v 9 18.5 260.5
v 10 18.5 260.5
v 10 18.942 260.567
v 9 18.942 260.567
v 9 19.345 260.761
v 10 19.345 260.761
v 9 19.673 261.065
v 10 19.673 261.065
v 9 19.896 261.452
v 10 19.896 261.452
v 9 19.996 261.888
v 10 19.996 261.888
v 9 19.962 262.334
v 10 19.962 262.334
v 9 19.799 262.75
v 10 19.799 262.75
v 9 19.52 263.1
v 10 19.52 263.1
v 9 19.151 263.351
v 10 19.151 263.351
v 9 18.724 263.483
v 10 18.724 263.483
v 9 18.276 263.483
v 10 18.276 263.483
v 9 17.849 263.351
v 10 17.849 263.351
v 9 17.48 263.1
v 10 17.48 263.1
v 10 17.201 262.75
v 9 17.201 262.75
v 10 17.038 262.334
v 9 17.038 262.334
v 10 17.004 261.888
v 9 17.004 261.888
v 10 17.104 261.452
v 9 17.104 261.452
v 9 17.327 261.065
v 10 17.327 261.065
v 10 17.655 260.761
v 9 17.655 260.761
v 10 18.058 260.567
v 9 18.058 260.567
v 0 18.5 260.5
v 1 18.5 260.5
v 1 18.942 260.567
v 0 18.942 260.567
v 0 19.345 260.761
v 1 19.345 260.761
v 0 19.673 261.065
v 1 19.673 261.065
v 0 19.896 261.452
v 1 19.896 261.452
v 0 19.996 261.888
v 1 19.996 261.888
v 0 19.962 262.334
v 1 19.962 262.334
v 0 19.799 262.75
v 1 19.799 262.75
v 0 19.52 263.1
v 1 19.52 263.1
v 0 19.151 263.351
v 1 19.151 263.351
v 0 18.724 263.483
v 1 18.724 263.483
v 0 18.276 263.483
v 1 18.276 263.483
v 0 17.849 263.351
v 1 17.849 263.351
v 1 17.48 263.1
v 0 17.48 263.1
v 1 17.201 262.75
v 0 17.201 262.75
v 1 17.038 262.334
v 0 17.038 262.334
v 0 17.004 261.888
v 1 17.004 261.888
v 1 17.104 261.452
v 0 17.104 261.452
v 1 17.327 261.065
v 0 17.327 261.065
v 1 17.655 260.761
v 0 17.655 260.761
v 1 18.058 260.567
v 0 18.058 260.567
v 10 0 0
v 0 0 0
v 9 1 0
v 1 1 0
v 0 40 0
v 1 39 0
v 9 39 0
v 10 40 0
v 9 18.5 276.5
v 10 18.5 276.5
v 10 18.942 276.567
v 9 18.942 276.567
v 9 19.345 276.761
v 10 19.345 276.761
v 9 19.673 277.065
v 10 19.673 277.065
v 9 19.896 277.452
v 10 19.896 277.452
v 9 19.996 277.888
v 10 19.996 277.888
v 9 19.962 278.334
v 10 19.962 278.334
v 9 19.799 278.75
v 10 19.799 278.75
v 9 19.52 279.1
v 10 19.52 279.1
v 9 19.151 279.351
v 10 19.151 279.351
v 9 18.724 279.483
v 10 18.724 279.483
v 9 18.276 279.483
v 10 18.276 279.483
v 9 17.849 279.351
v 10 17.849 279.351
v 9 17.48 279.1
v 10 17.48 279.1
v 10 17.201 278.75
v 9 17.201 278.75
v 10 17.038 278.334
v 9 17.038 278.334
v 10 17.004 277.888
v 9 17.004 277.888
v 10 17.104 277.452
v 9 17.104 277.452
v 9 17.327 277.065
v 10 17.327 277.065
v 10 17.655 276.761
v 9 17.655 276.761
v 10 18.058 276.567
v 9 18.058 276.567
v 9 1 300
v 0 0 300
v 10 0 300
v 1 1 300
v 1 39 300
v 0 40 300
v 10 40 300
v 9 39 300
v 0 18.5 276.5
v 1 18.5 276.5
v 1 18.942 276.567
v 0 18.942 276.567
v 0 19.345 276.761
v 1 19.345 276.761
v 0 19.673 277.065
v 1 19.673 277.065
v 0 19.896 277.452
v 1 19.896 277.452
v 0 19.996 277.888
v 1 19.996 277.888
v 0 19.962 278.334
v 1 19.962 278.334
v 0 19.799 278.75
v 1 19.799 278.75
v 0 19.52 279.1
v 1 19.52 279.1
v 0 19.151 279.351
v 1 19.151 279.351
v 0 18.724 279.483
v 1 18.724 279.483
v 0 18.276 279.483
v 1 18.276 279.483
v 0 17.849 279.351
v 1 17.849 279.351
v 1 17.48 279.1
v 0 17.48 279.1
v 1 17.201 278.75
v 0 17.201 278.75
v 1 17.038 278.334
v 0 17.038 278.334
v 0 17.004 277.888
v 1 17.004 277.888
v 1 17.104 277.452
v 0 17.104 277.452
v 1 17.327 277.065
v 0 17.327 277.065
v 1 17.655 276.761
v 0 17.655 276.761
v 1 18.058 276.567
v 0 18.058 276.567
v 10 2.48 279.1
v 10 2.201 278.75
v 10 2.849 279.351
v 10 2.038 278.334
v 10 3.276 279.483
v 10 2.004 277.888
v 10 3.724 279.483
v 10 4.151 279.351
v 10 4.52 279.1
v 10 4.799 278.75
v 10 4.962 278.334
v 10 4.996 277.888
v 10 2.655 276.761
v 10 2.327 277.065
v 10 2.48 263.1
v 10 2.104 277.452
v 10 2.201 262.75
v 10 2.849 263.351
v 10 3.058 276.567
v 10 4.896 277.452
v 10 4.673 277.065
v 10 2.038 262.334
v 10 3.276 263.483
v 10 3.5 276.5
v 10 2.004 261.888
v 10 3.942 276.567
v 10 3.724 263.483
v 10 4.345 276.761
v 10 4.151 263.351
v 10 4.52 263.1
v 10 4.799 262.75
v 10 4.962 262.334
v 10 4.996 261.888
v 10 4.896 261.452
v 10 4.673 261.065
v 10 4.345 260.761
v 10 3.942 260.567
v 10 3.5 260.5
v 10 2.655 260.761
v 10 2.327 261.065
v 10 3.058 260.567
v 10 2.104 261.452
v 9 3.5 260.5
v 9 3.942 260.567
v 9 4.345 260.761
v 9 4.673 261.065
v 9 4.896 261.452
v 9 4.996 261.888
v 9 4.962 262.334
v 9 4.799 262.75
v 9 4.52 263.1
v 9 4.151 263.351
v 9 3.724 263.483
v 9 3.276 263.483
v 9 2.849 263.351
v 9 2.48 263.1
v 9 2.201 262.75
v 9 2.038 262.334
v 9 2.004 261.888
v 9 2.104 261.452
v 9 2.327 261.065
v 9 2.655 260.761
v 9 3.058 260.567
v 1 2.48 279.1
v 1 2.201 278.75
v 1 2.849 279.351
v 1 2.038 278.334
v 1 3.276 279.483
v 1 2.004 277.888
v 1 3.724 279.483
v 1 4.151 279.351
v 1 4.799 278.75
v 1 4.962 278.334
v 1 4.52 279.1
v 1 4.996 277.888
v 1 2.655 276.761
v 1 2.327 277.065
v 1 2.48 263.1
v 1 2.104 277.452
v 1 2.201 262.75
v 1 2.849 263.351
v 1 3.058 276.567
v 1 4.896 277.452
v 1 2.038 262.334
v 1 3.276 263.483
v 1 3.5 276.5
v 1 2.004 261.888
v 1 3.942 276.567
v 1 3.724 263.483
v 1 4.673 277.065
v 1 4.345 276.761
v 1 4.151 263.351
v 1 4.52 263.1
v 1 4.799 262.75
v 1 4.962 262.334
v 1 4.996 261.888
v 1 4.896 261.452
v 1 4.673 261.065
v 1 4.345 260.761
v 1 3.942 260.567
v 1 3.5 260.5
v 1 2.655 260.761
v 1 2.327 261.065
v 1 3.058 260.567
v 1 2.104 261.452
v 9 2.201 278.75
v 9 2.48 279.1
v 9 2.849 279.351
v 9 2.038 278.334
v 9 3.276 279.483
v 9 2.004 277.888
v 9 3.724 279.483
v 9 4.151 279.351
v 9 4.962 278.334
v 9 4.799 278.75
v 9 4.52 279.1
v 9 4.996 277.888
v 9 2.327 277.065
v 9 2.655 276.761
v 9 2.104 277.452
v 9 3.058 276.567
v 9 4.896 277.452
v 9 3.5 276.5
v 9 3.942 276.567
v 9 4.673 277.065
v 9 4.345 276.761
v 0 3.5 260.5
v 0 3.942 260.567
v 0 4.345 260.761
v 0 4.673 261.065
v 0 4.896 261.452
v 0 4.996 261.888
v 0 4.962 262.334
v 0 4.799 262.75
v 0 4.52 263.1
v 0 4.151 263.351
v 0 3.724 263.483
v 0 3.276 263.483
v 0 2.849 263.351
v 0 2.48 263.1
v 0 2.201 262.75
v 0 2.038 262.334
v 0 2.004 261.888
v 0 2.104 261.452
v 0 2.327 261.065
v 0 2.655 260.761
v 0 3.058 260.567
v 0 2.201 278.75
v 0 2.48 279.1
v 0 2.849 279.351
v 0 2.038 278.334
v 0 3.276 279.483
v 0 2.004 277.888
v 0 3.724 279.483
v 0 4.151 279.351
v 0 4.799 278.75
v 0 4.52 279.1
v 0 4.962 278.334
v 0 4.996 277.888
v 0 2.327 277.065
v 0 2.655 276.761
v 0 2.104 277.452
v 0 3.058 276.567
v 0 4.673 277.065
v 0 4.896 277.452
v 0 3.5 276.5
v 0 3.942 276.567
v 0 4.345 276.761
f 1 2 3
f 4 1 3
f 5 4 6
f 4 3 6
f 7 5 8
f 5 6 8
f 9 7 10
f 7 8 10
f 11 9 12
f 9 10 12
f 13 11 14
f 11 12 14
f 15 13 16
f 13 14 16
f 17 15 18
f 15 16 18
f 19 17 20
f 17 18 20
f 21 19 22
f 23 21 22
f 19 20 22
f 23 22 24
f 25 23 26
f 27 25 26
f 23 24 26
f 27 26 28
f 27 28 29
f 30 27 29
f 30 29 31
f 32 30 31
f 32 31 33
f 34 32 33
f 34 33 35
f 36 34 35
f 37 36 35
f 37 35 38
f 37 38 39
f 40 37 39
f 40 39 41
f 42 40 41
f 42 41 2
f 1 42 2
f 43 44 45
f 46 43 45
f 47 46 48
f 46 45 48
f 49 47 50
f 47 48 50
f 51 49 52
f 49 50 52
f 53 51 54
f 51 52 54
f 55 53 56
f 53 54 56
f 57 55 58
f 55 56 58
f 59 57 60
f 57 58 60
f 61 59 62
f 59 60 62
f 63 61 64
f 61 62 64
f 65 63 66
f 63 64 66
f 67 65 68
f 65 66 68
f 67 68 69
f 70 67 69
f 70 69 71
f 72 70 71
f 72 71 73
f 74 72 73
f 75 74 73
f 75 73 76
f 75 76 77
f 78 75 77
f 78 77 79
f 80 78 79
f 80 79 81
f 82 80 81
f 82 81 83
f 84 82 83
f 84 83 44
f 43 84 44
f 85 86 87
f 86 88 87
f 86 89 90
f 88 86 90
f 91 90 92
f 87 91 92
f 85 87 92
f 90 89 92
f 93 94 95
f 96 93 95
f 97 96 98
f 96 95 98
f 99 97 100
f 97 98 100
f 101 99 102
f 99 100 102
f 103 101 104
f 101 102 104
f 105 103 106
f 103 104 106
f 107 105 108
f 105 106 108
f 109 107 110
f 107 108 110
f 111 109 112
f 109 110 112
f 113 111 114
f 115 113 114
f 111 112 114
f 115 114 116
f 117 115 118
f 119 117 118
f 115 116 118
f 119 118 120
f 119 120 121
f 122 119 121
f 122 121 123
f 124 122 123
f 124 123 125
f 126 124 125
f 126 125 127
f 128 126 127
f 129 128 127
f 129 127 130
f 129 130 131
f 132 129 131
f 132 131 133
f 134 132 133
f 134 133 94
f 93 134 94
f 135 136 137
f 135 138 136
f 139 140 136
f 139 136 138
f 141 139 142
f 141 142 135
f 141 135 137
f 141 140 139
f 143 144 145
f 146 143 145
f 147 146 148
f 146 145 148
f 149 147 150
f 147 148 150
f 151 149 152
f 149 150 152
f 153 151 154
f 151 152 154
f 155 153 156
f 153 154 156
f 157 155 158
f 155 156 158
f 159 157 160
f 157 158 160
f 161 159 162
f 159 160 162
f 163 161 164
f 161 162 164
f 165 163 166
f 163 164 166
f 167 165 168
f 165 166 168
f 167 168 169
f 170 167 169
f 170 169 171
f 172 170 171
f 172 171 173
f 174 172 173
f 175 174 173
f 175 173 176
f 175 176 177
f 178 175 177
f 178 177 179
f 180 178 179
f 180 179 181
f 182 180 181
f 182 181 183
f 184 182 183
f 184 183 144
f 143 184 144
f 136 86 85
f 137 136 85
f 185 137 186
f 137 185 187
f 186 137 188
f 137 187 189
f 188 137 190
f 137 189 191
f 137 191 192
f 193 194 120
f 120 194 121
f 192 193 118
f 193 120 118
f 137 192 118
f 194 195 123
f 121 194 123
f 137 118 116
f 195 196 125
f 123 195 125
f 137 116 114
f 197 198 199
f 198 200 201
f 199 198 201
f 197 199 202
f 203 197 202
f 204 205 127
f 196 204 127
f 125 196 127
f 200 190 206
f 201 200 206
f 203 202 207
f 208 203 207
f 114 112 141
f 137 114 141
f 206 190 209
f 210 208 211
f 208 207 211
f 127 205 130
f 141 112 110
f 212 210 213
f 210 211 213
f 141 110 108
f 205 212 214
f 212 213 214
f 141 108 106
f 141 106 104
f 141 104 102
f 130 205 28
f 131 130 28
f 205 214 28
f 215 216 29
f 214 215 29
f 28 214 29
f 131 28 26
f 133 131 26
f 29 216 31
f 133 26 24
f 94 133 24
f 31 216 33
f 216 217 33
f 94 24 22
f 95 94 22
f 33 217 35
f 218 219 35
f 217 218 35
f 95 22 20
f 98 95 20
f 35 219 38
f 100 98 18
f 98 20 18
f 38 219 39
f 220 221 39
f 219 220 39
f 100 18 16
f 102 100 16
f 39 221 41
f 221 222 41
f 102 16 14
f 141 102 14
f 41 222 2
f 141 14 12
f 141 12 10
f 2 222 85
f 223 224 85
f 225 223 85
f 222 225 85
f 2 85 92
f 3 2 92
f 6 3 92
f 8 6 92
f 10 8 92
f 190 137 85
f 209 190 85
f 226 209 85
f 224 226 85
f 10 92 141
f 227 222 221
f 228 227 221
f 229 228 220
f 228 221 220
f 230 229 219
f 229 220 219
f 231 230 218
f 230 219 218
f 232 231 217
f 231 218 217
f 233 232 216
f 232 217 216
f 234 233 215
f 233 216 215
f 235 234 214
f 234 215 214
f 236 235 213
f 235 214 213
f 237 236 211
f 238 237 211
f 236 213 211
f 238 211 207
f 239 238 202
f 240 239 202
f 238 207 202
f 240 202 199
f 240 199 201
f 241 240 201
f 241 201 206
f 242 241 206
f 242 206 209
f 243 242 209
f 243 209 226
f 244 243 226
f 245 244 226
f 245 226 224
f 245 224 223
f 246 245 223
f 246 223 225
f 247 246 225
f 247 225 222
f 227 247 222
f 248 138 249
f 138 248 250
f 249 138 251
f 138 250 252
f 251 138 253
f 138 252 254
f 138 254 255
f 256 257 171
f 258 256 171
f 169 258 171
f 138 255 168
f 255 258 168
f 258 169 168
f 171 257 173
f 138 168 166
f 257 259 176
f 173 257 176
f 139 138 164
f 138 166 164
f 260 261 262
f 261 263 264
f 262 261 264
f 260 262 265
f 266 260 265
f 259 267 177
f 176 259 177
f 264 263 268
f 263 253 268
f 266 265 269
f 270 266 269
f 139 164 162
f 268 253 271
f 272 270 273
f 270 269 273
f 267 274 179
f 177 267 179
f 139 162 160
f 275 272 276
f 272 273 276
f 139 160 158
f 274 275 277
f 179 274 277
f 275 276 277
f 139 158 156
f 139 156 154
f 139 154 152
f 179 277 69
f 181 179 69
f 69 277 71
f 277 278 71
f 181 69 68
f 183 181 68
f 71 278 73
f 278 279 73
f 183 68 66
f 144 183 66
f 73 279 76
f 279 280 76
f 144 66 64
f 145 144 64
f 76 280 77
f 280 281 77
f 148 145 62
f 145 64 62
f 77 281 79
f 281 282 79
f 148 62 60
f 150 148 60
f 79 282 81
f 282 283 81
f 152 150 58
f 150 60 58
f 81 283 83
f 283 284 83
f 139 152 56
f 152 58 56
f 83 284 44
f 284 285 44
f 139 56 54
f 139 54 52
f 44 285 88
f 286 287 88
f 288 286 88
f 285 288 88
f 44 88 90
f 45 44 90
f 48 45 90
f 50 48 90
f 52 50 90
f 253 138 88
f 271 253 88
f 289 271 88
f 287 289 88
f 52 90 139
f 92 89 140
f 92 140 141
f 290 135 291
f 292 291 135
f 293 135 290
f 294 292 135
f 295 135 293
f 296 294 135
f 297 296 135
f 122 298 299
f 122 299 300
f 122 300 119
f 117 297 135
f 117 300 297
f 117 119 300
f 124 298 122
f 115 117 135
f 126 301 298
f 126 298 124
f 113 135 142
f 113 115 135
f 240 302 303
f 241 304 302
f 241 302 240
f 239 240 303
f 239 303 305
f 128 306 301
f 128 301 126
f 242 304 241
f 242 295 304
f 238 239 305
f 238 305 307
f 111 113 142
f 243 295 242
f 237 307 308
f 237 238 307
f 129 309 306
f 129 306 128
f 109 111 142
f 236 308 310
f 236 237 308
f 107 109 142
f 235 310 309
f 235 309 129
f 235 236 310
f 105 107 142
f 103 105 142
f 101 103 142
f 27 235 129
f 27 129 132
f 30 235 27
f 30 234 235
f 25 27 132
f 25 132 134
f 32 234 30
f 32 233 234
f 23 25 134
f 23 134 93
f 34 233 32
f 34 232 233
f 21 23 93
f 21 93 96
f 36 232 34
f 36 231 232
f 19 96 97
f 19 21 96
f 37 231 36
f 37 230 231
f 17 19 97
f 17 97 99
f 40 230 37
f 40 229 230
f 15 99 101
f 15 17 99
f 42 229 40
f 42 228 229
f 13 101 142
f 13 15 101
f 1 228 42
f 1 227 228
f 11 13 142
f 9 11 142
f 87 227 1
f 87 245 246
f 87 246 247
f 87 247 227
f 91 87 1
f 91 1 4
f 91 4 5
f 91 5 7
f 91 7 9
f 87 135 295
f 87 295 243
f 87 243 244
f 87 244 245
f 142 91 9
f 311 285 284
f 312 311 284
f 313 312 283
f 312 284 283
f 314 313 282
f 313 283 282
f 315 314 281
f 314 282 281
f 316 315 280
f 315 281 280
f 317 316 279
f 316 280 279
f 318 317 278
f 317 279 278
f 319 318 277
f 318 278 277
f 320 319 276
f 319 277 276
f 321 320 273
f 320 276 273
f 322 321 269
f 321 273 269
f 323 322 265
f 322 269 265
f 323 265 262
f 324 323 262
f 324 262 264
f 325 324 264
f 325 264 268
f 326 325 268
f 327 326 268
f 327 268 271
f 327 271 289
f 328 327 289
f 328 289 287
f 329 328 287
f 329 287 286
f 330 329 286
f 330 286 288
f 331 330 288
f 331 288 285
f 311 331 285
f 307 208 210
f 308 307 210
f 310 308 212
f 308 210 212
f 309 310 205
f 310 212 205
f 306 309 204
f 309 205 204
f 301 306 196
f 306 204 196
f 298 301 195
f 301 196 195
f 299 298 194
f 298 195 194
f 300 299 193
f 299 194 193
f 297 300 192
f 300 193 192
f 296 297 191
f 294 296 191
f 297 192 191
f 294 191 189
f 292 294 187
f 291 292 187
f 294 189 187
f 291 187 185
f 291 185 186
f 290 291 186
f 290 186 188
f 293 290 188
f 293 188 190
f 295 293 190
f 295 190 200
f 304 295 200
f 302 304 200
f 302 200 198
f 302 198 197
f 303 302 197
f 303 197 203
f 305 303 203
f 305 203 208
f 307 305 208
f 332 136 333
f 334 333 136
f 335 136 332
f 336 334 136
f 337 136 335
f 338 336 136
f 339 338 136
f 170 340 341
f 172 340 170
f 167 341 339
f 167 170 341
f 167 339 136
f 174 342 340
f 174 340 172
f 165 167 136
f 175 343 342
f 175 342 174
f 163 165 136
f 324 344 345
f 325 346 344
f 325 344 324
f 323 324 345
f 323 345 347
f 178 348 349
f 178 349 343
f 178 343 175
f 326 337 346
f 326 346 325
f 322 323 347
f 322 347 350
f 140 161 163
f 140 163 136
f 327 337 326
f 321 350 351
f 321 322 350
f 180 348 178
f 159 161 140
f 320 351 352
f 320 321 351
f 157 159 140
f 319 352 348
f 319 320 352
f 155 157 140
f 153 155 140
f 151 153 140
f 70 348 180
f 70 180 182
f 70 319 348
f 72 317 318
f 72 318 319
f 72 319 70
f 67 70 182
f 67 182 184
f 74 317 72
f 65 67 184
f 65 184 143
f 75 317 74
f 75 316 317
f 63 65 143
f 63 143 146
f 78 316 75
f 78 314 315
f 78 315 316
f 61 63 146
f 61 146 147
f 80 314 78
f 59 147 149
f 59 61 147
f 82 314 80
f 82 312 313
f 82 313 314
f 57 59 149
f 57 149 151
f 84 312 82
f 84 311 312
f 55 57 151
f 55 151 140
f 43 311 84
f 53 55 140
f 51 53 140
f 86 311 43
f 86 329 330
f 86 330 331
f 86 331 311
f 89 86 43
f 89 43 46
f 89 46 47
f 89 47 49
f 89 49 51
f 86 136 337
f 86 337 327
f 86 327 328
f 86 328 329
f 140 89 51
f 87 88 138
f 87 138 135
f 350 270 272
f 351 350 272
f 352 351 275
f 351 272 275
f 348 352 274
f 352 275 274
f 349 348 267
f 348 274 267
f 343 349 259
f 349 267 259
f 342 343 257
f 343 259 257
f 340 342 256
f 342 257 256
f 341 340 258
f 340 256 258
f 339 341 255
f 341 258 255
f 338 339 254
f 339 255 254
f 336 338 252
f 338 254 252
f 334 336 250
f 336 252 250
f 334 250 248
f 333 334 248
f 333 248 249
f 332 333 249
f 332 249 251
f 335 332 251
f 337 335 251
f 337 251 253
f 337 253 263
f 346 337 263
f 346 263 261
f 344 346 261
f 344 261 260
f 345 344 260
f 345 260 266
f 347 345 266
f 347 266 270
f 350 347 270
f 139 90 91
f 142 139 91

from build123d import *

# Parameters (mm, degrees)
SKETCH_1_W          = 10
SKETCH_1_H          = 40
SKETCH_1_W_2        = 8
SKETCH_1_H_2        = 38
EXTRUDE_1_DEPTH     = 300
SKETCH_3_R          = 1.5
CUT_EXTRUDE_2_DEPTH = 10


with BuildPart() as part:
    # 草图1 → 凸台-拉伸1 (new body)
    with BuildSketch(Plane.XY):
        with Locations((5, 20)):
            Rectangle(SKETCH_1_W, SKETCH_1_H)
        with Locations((5, 20)):
            Rectangle(SKETCH_1_W_2, SKETCH_1_H_2, mode=Mode.SUBTRACT)
    extrude(amount=EXTRUDE_1_DEPTH)

    # 草图3 → 切除-拉伸2 (cut)
    with BuildSketch(Plane(origin=(10, 0, 0), x_dir=(0, 0, -1), z_dir=(1, 0, 0))):
        with Locations((-278, 18.5)):
            Circle(SKETCH_3_R)
        with Locations((-262, 18.5)):
            Circle(SKETCH_3_R)
        with Locations((-262, 3.5)):
            Circle(SKETCH_3_R)
        with Locations((-278, 3.5)):
            Circle(SKETCH_3_R)
    extrude(amount=-CUT_EXTRUDE_2_DEPTH, mode=Mode.SUBTRACT)


solid = part.part
